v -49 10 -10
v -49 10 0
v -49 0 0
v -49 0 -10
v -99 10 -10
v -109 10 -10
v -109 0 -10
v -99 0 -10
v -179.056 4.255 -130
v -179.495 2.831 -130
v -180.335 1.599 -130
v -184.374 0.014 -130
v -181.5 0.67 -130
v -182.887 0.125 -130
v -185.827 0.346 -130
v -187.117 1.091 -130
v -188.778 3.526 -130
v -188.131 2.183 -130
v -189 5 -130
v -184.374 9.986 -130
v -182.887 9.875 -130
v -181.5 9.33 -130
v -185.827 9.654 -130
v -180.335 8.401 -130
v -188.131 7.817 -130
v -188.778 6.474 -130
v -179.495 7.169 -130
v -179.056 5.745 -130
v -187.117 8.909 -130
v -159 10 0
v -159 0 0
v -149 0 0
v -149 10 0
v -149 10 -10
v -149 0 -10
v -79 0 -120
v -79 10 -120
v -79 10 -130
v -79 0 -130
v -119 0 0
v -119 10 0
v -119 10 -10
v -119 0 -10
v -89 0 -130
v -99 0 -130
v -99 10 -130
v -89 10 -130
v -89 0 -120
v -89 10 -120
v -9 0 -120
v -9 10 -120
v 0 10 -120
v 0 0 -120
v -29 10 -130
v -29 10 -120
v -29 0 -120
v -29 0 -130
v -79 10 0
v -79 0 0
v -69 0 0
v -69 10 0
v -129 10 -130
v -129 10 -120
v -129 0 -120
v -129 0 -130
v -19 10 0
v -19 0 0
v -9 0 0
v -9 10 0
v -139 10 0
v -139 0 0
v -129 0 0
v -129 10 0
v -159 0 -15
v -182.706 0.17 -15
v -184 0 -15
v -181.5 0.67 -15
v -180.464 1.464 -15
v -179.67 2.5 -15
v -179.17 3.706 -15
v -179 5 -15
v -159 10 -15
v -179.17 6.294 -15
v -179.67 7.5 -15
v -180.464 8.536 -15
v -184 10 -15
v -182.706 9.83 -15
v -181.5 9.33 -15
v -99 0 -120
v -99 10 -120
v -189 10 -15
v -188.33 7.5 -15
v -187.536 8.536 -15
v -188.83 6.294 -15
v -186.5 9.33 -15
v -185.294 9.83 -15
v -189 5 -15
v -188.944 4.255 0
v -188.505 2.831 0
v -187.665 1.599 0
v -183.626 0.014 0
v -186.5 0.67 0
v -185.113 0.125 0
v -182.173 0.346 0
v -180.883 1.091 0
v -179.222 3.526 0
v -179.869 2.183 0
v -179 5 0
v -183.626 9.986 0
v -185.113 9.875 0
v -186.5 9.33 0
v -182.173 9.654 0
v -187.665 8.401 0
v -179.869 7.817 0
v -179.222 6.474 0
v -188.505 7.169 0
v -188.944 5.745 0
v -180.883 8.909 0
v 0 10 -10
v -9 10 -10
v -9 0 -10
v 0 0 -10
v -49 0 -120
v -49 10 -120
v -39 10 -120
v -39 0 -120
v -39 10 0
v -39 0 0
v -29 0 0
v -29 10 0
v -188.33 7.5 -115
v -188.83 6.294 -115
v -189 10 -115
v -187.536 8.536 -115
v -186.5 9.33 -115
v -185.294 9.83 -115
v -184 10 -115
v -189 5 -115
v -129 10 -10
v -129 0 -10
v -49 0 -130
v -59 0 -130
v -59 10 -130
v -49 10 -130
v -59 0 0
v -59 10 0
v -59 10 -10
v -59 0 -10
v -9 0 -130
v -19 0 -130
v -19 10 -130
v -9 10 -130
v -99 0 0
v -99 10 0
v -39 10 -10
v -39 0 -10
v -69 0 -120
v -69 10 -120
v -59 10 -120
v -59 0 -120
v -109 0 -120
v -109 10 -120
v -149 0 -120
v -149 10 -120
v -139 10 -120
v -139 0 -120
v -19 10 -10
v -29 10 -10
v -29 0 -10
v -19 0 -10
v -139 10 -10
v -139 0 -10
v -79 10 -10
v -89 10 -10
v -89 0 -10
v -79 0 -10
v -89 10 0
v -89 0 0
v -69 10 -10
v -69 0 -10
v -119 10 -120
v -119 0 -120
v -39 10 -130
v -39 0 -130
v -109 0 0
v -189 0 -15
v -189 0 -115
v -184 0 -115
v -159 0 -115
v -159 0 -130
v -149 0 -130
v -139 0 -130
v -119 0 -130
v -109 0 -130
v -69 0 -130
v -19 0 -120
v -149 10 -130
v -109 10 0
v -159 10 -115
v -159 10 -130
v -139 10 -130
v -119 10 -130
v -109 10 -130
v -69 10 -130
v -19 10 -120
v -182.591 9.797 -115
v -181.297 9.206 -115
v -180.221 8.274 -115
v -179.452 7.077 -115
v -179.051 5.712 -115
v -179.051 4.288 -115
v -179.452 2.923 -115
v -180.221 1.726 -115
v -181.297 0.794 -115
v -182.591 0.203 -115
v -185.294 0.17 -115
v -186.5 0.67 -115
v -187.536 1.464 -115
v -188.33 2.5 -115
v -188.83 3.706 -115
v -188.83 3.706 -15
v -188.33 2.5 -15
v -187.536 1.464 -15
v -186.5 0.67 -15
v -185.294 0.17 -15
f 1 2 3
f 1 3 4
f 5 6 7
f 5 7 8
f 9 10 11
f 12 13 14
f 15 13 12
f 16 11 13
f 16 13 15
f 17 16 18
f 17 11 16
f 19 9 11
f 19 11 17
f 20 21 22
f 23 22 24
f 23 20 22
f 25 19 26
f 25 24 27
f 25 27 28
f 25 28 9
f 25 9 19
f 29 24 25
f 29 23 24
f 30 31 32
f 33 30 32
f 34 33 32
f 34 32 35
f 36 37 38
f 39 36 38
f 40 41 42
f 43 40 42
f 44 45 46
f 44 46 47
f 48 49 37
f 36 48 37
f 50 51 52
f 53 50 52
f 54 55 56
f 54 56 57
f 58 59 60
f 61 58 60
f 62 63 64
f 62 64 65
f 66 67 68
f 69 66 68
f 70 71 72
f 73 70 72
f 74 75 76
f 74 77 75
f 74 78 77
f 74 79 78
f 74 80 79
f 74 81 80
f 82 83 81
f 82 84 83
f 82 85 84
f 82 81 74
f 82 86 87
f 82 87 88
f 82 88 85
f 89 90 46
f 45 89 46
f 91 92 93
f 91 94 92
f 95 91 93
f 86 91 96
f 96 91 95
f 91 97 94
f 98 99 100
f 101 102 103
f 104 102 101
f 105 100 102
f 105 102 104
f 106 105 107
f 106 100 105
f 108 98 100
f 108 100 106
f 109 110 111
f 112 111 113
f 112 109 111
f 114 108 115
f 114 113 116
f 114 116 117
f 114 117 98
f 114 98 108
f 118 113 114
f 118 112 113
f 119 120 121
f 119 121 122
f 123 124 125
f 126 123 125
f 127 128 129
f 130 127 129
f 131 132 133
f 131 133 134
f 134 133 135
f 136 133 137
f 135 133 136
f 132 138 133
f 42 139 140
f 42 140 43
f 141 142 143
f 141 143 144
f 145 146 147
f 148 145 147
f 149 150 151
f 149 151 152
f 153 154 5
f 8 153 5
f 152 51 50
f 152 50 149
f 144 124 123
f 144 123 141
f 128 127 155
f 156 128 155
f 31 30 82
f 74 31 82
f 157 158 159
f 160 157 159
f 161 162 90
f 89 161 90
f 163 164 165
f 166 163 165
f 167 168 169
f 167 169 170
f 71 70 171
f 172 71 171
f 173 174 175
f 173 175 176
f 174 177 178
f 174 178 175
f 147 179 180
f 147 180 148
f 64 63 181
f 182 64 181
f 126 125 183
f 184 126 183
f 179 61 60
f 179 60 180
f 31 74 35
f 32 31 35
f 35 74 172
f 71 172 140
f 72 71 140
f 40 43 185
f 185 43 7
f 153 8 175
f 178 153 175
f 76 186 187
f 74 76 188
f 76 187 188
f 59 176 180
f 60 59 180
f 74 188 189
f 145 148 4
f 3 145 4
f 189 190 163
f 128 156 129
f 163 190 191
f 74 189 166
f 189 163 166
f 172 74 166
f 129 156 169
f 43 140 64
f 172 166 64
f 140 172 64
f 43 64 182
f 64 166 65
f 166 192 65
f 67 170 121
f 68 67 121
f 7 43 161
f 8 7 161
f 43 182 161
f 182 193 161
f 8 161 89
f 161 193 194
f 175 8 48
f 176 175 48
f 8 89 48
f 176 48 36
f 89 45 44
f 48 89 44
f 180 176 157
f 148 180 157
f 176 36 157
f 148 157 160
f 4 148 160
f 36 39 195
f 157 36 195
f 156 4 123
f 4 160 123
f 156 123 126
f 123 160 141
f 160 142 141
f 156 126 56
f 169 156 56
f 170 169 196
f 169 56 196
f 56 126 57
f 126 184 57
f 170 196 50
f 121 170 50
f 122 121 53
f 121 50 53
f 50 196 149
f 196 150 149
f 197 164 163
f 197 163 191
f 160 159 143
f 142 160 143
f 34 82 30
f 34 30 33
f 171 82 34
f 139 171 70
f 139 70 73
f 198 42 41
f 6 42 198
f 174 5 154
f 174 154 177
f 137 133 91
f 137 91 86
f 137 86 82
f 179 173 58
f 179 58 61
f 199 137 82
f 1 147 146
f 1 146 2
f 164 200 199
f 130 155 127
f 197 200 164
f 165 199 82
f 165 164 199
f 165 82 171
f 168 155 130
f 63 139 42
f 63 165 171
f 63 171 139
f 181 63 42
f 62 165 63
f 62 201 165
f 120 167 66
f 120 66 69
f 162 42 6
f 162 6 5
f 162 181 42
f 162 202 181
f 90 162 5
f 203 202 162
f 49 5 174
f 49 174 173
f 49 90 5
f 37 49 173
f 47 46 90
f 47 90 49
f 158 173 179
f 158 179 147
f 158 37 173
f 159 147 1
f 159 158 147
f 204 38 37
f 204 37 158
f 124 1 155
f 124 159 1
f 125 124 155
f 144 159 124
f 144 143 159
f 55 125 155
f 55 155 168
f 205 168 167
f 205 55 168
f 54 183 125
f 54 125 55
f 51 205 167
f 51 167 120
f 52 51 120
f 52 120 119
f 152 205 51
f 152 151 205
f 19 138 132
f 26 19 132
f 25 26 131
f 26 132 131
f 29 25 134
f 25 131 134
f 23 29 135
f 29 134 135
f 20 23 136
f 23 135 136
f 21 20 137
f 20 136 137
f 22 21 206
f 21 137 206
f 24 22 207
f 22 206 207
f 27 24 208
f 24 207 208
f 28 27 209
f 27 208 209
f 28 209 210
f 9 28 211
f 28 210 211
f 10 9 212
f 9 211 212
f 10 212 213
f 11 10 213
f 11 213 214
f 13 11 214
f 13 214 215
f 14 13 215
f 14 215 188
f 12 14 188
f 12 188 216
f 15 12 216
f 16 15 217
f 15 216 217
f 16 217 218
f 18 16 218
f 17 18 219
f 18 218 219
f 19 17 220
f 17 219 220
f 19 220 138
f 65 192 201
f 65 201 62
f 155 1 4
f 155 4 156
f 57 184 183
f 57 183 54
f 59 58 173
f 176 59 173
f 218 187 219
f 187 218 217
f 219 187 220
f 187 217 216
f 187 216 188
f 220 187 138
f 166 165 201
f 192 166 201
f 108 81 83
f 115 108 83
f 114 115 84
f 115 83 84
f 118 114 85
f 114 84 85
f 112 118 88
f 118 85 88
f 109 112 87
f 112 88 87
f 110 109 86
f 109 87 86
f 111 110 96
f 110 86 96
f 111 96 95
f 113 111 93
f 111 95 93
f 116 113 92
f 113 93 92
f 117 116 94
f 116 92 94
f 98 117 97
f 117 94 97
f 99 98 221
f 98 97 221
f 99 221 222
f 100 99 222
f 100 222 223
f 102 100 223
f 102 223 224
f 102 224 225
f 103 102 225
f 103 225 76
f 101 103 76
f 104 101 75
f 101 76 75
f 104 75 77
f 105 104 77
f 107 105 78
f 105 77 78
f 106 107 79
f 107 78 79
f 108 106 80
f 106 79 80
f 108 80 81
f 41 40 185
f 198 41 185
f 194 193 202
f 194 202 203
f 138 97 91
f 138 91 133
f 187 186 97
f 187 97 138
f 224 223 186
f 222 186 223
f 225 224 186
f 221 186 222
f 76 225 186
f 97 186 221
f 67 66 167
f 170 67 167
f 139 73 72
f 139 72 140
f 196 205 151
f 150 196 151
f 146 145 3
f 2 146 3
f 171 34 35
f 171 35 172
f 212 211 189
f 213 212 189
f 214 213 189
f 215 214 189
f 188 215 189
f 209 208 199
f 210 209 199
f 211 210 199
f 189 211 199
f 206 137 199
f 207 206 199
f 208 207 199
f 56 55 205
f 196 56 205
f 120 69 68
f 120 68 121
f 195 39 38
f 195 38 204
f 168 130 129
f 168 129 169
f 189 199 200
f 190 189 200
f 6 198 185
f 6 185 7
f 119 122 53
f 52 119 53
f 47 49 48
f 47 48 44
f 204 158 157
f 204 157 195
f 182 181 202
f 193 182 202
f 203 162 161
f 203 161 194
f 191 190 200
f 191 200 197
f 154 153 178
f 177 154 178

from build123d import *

# Parameters (mm, degrees)
ESQUISSE1_W                = 189
ESQUISSE1_H                = 130
BOSS_EXTRU_1_DEPTH         = 10
ESQUISSE2_W                = 30
ESQUISSE2_H                = 15
ENL_V_MAT_EXTRU_1_DEPTH    = 10
ESQUISSE3_W                = 10
ESQUISSE3_H                = 10
ENL_V_MAT_EXTRU_2_DEPTH    = 10
R_P_TITION_LIN_AIRE1_COUNT = 8
R_P_TITION_LIN_AIRE1_PITCH = 20
ESQUISSE4_R                = 5
BOSS_EXTRU_2_DEPTH         = 15
ESQUISSE5_R                = 5
BOSS_EXTRU_4_DEPTH         = 15


with BuildPart() as part:
    # Esquisse1 → Boss.-Extru.1 (new body)
    with BuildSketch(Plane(origin=(0, 0, 0), x_dir=(1, 0, 0), z_dir=(0, 1, 0))):
        with Locations((-94.5, 65)):
            Rectangle(ESQUISSE1_W, ESQUISSE1_H)
    extrude(amount=BOSS_EXTRU_1_DEPTH)

    # Esquisse2 → Enlèv. mat.-Extru.1 (cut)
    with BuildSketch(Plane(origin=(0, 10, 0), x_dir=(1, 0, 0), z_dir=(0, 1, 0))):
        with Locations((-174, 122.5)):
            Rectangle(ESQUISSE2_W, ESQUISSE2_H)
        with Locations((-174, 7.5)):
            Rectangle(ESQUISSE2_W, ESQUISSE2_H)
    extrude(amount=-ENL_V_MAT_EXTRU_1_DEPTH, mode=Mode.SUBTRACT)

    # Esquisse3 → Enlèv. mat.-Extru.2 (cut)
    with BuildSketch(Plane(origin=(0, 10, 0), x_dir=(1, 0, 0), z_dir=(0, 1, 0))):
        with Locations((-144, 125)):
            Rectangle(ESQUISSE3_W, ESQUISSE3_H)
        with Locations((-144, 5)):
            Rectangle(ESQUISSE3_W, ESQUISSE3_H)
    enl_v_mat_extru_2 = extrude(amount=-ENL_V_MAT_EXTRU_2_DEPTH, mode=Mode.SUBTRACT)

    # Répétition linéaire1: Enlèv. mat.-Extru.2 ×8
    with Locations(*[(i * R_P_TITION_LIN_AIRE1_PITCH, 0, 0) for i in range(1, R_P_TITION_LIN_AIRE1_COUNT)]):
        add(enl_v_mat_extru_2, mode=Mode.SUBTRACT)

    # Esquisse4 → Boss.-Extru.2 (add)
    with BuildSketch(Plane.XY.offset(-15)):
        with Locations((-184, 5)):
            Circle(ESQUISSE4_R)
    extrude(amount=BOSS_EXTRU_2_DEPTH)

    # Esquisse5 → Boss.-Extru.4 (add)
    with BuildSketch(Plane(origin=(0, 0, -115), x_dir=(-1, 0, 0), z_dir=(0, 0, -1))):
        with Locations((184, 5)):
            Circle(ESQUISSE5_R)
    extrude(amount=BOSS_EXTRU_4_DEPTH)


solid = part.part
